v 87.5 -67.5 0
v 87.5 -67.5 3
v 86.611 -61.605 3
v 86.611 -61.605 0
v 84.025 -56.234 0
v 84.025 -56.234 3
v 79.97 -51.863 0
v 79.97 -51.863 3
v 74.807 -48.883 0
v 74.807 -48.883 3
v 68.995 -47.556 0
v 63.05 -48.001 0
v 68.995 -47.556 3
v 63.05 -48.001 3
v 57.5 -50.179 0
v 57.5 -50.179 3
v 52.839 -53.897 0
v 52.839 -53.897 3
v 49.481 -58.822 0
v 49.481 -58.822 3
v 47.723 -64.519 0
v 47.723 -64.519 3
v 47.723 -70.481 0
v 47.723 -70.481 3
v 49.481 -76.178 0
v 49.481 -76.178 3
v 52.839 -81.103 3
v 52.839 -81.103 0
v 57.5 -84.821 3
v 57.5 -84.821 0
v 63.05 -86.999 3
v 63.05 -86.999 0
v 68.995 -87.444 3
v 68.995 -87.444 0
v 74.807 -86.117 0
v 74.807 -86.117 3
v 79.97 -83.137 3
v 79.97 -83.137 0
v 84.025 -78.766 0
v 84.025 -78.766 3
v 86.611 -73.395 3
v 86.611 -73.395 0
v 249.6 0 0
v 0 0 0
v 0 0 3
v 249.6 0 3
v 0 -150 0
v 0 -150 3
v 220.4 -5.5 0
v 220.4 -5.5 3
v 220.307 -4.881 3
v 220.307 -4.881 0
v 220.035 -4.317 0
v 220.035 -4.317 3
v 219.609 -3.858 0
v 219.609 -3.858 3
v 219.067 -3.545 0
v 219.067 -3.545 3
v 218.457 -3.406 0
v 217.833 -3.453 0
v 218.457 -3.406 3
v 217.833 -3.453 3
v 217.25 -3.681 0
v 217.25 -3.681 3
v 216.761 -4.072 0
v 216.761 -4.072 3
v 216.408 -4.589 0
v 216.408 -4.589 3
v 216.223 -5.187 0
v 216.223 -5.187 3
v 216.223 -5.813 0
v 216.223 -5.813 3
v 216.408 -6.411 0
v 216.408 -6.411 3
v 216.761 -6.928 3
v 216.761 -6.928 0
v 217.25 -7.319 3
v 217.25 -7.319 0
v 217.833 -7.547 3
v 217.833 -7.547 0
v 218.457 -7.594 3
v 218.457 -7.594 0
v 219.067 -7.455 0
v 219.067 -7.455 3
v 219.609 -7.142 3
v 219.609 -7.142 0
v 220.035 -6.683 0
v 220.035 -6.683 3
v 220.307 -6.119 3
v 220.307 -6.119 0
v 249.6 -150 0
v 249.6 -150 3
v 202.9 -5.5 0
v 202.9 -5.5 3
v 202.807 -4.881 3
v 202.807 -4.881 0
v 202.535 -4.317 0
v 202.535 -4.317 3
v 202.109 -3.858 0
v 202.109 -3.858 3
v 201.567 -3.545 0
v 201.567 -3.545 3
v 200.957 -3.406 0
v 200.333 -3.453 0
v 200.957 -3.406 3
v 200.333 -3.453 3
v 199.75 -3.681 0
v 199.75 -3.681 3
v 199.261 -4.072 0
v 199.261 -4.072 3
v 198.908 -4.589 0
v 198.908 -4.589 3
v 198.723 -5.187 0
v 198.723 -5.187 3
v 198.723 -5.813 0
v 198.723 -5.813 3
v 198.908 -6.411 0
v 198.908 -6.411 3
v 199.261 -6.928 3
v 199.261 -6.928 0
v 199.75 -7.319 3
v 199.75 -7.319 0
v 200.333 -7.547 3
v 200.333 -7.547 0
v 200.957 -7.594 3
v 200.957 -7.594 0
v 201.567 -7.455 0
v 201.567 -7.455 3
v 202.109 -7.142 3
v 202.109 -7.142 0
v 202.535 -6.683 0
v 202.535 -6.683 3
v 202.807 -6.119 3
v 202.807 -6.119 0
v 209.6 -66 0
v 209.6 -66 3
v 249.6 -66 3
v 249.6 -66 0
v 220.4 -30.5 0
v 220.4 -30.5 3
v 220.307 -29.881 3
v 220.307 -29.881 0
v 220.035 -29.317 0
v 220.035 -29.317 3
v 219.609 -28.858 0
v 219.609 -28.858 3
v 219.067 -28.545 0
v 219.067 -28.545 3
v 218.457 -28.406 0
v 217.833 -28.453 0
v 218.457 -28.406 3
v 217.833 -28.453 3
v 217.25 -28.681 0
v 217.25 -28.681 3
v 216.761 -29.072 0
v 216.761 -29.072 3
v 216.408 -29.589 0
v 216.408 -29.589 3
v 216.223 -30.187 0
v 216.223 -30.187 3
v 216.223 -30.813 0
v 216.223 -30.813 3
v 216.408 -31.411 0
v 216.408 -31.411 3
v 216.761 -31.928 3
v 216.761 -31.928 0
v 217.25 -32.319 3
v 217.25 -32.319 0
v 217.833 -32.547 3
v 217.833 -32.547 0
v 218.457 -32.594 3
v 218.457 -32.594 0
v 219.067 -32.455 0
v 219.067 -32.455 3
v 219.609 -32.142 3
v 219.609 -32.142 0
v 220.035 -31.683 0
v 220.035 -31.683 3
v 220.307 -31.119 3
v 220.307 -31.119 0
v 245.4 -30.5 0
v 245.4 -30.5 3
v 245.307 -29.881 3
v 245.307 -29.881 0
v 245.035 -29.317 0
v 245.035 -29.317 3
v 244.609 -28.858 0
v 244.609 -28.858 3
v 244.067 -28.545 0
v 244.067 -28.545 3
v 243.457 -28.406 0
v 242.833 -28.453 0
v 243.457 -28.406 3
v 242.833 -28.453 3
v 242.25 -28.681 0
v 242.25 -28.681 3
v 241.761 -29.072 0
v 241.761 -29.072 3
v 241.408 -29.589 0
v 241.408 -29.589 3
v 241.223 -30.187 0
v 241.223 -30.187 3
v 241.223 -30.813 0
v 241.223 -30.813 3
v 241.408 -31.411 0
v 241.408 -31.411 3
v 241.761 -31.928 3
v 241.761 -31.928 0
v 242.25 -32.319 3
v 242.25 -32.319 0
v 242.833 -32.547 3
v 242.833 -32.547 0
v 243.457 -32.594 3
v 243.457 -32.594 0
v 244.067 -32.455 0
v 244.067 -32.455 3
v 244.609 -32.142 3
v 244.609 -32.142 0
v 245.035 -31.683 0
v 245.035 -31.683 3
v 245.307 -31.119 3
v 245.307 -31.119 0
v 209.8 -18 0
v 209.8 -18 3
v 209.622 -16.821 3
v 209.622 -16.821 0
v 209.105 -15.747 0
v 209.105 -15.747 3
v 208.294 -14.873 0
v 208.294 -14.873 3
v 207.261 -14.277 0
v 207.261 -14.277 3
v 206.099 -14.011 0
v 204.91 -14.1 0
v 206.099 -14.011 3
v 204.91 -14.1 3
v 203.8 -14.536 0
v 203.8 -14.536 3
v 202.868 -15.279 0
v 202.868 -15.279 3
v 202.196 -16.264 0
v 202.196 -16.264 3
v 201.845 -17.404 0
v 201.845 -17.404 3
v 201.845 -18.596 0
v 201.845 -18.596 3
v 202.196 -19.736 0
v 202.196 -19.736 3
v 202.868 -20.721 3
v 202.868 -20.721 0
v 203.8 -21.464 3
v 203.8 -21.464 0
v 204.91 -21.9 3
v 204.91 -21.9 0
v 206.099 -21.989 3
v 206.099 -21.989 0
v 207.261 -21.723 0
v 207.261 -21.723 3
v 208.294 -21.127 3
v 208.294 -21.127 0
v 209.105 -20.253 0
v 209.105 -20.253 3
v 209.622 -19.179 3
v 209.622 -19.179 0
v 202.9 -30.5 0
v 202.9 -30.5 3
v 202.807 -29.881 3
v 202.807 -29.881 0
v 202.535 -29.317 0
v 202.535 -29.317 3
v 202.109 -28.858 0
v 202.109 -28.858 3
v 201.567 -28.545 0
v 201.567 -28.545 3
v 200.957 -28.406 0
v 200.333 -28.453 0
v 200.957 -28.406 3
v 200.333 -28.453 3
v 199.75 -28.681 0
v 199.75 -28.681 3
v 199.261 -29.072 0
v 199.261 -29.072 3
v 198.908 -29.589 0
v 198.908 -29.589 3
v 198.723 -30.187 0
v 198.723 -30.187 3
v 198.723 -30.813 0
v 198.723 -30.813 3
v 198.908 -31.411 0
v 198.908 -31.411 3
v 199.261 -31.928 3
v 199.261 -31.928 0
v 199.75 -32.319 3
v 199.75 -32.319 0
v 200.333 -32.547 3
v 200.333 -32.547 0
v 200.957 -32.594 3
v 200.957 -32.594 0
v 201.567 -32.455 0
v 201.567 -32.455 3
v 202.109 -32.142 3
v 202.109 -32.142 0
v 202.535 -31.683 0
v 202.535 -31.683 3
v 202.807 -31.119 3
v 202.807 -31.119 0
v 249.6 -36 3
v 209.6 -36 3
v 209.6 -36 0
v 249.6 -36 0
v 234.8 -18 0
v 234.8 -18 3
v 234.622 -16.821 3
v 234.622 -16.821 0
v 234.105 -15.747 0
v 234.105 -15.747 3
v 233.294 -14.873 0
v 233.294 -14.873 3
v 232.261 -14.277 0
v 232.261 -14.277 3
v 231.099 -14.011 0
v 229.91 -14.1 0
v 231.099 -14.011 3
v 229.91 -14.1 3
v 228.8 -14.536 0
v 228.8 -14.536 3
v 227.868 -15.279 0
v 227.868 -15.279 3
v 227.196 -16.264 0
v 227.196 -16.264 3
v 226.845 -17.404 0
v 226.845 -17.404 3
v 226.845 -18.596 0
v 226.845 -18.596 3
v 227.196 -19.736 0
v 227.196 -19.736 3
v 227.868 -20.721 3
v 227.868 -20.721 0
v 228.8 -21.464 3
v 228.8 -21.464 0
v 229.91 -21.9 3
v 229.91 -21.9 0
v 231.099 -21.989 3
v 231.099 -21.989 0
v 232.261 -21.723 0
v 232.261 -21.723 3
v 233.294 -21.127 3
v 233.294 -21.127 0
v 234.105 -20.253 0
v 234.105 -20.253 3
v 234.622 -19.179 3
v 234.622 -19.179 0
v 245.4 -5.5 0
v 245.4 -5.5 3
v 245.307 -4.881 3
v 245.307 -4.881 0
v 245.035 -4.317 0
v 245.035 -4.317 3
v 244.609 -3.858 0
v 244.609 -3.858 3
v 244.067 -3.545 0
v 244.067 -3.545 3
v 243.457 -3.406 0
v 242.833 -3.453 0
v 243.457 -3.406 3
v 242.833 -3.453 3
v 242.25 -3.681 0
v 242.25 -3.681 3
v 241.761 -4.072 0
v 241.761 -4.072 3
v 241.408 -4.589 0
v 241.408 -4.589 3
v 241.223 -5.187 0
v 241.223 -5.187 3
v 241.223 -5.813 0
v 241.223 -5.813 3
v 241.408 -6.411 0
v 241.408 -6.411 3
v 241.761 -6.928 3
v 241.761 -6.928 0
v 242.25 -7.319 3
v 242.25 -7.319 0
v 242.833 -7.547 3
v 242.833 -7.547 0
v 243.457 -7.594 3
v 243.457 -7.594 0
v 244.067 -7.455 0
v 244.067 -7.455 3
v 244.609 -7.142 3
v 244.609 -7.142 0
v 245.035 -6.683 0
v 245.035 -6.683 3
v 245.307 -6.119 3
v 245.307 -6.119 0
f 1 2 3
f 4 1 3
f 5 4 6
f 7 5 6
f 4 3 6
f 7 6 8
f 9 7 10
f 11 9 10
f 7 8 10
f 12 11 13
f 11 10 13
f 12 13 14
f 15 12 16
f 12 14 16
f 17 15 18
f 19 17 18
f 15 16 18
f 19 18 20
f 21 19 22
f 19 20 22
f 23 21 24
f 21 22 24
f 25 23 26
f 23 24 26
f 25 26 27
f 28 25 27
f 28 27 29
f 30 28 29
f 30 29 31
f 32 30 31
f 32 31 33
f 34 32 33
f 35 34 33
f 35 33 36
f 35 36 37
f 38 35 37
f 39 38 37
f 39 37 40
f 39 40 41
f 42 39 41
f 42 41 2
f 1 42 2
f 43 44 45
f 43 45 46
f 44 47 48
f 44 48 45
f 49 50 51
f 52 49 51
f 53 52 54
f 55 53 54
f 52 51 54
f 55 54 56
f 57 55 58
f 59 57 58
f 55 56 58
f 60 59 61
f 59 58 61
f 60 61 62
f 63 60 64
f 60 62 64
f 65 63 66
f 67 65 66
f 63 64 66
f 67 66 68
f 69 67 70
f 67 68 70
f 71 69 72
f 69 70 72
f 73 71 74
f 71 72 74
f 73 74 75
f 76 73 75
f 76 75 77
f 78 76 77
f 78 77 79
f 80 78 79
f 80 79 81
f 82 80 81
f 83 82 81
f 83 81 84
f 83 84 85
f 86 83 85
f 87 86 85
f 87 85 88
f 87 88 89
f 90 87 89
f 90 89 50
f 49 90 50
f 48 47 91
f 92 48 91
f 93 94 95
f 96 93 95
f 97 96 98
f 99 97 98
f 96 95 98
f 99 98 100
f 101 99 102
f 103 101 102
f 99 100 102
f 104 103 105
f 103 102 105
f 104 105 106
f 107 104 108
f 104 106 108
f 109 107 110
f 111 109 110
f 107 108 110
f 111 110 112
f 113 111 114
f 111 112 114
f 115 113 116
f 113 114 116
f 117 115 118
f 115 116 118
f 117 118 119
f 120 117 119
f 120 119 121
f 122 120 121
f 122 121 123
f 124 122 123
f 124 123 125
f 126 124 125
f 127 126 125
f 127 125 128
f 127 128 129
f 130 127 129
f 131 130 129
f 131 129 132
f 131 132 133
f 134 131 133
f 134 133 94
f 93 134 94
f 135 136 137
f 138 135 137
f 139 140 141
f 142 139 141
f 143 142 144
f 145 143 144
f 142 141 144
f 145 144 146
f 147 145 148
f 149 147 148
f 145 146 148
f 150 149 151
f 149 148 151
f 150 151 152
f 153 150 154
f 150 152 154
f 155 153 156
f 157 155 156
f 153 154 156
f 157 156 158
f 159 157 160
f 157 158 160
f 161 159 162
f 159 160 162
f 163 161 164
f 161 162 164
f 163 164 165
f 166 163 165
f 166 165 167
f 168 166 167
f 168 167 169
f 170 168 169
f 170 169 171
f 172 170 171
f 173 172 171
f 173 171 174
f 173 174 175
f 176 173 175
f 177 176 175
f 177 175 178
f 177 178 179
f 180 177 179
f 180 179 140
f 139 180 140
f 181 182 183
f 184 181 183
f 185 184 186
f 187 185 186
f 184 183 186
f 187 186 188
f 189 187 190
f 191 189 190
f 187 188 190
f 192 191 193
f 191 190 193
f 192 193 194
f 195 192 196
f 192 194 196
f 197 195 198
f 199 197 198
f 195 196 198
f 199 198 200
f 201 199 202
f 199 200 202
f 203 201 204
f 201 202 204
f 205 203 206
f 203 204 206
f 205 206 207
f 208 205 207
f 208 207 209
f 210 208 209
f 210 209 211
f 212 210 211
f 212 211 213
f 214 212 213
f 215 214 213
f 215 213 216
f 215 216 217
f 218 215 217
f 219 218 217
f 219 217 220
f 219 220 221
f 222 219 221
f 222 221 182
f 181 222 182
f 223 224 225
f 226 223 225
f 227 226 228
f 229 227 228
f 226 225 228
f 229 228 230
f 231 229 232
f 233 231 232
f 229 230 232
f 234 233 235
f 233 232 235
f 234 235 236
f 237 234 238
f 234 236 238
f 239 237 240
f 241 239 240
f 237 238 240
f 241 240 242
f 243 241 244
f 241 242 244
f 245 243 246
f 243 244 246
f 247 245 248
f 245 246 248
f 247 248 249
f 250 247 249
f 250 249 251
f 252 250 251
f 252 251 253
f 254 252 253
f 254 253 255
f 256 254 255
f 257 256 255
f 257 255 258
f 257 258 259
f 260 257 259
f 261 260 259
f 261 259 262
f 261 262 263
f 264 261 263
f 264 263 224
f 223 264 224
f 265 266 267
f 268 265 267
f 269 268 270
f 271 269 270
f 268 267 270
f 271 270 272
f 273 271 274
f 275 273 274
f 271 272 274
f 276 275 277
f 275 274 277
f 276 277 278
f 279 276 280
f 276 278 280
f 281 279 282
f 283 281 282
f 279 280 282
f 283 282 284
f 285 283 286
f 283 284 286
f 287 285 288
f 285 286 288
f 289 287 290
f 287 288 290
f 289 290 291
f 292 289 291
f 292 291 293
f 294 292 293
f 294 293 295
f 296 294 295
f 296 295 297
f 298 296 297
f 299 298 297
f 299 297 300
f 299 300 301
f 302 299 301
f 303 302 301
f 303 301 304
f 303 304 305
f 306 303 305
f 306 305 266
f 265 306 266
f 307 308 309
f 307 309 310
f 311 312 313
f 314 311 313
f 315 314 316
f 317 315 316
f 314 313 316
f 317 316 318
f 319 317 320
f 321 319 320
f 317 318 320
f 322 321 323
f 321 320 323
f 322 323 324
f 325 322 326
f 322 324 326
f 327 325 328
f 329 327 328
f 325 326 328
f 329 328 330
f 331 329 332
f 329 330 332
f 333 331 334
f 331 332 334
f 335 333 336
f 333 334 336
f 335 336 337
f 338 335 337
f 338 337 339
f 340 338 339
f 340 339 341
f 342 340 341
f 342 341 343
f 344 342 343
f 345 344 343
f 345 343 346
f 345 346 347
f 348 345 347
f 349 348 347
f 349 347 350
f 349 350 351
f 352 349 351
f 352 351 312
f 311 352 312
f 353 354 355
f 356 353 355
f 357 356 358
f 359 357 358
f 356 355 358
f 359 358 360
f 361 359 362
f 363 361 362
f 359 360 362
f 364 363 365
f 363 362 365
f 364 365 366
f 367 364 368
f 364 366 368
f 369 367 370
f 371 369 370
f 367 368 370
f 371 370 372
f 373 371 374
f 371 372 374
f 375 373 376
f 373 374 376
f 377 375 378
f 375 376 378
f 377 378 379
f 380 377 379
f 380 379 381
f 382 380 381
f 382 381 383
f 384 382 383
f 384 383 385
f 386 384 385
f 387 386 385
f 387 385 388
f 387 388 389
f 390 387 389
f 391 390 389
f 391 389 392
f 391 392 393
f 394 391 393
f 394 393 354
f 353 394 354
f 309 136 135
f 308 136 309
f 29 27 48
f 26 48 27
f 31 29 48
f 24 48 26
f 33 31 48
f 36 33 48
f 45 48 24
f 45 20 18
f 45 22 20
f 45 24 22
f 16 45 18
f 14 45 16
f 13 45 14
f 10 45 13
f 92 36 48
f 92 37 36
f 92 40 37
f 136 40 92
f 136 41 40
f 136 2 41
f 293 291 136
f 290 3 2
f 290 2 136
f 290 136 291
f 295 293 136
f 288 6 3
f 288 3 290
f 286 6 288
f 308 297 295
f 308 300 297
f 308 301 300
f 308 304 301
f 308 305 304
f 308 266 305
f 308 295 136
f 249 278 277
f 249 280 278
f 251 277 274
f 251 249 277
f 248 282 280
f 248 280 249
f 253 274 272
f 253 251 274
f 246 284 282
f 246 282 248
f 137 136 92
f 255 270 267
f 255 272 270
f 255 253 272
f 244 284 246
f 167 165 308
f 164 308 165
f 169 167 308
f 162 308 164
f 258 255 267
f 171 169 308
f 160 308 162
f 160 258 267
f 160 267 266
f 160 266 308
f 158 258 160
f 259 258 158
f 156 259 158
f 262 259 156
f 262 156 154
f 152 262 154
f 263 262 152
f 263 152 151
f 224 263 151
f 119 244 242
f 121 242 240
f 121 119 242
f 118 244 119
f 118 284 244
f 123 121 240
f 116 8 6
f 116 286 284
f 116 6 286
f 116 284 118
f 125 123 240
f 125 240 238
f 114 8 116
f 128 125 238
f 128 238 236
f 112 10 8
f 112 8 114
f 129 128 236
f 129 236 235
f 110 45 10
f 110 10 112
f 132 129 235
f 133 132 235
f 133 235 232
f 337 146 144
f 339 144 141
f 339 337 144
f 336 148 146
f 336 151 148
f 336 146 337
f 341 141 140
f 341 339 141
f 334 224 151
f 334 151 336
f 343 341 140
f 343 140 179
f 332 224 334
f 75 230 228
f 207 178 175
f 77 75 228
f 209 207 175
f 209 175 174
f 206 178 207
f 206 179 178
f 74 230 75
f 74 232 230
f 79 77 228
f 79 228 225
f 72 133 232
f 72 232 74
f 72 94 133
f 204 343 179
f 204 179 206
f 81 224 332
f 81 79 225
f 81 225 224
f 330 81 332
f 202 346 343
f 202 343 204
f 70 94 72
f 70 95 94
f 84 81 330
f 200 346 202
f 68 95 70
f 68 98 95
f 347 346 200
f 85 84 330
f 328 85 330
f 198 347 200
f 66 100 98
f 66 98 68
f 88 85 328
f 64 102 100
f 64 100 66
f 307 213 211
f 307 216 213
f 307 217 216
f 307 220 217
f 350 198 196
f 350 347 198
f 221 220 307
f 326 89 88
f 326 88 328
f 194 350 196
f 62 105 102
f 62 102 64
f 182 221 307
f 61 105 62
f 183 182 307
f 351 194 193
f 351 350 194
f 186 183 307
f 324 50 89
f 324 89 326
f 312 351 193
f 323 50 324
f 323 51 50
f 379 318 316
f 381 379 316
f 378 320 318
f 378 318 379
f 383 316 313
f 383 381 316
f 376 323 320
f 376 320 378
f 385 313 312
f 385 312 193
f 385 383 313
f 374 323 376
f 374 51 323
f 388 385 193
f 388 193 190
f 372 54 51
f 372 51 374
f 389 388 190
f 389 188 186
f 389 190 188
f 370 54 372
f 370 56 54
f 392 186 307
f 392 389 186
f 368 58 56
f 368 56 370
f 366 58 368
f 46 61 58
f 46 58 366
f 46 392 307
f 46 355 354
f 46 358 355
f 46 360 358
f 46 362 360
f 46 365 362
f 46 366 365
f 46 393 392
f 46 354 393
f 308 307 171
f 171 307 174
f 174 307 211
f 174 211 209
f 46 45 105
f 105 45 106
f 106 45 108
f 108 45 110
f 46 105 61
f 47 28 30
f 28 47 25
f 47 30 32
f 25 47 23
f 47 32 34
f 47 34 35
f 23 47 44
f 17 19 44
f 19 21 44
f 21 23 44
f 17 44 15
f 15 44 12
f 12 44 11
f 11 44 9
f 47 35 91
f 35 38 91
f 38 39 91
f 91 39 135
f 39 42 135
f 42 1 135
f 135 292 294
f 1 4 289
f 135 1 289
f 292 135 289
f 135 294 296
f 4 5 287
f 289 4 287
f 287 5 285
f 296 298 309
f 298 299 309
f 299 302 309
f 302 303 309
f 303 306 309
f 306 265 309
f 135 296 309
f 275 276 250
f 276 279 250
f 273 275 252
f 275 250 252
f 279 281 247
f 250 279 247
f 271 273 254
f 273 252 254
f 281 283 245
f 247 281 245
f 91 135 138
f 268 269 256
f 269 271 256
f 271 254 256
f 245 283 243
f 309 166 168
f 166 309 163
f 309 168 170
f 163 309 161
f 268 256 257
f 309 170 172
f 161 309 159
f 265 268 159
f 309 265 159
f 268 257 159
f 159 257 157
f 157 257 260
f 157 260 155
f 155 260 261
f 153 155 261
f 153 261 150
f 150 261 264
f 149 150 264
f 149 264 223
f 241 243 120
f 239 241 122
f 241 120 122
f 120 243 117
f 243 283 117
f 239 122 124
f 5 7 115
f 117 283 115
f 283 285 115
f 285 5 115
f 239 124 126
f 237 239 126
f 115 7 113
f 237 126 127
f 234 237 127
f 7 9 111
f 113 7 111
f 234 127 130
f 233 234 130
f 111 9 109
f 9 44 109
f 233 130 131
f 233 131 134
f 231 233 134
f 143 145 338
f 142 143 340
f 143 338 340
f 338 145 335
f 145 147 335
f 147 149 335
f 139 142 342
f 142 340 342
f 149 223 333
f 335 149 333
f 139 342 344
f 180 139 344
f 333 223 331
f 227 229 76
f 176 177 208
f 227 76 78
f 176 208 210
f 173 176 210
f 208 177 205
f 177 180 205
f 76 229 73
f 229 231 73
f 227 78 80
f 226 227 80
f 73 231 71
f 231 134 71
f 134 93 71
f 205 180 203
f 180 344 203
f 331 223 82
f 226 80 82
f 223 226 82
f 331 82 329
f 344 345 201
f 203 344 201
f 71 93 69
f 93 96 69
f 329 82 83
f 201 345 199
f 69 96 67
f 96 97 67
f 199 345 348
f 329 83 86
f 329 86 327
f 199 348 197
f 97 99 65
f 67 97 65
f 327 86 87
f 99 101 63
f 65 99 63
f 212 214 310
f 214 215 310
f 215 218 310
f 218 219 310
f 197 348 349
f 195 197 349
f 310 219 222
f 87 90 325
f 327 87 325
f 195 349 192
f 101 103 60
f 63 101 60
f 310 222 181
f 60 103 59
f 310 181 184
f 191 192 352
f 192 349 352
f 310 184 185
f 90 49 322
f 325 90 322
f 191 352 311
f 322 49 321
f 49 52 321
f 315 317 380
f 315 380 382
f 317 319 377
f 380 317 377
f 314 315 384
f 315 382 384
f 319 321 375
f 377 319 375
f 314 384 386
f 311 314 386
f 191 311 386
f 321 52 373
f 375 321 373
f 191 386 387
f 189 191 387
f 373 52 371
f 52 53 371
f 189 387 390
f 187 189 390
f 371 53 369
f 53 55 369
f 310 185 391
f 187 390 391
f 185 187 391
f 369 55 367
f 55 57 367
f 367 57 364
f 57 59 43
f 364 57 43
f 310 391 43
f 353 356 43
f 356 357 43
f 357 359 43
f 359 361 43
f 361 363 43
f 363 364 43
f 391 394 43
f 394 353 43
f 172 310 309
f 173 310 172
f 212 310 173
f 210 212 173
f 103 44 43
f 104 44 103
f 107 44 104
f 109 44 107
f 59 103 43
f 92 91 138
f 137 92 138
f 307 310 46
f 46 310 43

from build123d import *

# Parameters (mm, degrees)
SKETCH1_W           = 249.6
SKETCH1_H           = 150
BOSS_EXTRUDE1_DEPTH = 3
SKETCH2_R           = 20
CUT_EXTRUDE1_DEPTH  = 4
SKETCH3_W           = 40
SKETCH3_H           = 30
CUT_EXTRUDE2_DEPTH  = 5
SKETCH4_R           = 2.1
SKETCH4_R_2         = 4
CUT_EXTRUDE3_DEPTH  = 4


with BuildPart() as part:
    # Sketch1 → Boss-Extrude1 (new body)
    with BuildSketch(Plane.XY):
        with Locations((124.8, -75)):
            Rectangle(SKETCH1_W, SKETCH1_H)
    extrude(amount=BOSS_EXTRUDE1_DEPTH)

    # Sketch2 → Cut-Extrude1 (cut, through all)
    with BuildSketch(Plane.XY.offset(3)):
        with Locations((67.5, -67.5)):
            Circle(SKETCH2_R)
    extrude(amount=-CUT_EXTRUDE1_DEPTH, mode=Mode.SUBTRACT)

    # Sketch3 → Cut-Extrude2 (cut)
    with BuildSketch(Plane.XY.offset(3)):
        with Locations((229.6, -51)):
            Rectangle(SKETCH3_W, SKETCH3_H)
    extrude(amount=-CUT_EXTRUDE2_DEPTH, mode=Mode.SUBTRACT)

    # Sketch4 → Cut-Extrude3 (cut, through all)
    with BuildSketch(Plane.XY.offset(3)):
        with Locations((200.8, -5.5)):
            Circle(SKETCH4_R)
        with Locations((218.3, -5.5)):
            Circle(SKETCH4_R)
        with Locations((205.8, -18)):
            Circle(SKETCH4_R_2)
        with Locations((200.8, -30.5)):
            Circle(SKETCH4_R)
        with Locations((218.3, -30.5)):
            Circle(SKETCH4_R)
        with Locations((243.3, -5.5)):
            Circle(SKETCH4_R)
        with Locations((243.3, -30.5)):
            Circle(SKETCH4_R)
        with Locations((230.8, -18)):
            Circle(SKETCH4_R_2)
    extrude(amount=-CUT_EXTRUDE3_DEPTH, mode=Mode.SUBTRACT)


solid = part.part
